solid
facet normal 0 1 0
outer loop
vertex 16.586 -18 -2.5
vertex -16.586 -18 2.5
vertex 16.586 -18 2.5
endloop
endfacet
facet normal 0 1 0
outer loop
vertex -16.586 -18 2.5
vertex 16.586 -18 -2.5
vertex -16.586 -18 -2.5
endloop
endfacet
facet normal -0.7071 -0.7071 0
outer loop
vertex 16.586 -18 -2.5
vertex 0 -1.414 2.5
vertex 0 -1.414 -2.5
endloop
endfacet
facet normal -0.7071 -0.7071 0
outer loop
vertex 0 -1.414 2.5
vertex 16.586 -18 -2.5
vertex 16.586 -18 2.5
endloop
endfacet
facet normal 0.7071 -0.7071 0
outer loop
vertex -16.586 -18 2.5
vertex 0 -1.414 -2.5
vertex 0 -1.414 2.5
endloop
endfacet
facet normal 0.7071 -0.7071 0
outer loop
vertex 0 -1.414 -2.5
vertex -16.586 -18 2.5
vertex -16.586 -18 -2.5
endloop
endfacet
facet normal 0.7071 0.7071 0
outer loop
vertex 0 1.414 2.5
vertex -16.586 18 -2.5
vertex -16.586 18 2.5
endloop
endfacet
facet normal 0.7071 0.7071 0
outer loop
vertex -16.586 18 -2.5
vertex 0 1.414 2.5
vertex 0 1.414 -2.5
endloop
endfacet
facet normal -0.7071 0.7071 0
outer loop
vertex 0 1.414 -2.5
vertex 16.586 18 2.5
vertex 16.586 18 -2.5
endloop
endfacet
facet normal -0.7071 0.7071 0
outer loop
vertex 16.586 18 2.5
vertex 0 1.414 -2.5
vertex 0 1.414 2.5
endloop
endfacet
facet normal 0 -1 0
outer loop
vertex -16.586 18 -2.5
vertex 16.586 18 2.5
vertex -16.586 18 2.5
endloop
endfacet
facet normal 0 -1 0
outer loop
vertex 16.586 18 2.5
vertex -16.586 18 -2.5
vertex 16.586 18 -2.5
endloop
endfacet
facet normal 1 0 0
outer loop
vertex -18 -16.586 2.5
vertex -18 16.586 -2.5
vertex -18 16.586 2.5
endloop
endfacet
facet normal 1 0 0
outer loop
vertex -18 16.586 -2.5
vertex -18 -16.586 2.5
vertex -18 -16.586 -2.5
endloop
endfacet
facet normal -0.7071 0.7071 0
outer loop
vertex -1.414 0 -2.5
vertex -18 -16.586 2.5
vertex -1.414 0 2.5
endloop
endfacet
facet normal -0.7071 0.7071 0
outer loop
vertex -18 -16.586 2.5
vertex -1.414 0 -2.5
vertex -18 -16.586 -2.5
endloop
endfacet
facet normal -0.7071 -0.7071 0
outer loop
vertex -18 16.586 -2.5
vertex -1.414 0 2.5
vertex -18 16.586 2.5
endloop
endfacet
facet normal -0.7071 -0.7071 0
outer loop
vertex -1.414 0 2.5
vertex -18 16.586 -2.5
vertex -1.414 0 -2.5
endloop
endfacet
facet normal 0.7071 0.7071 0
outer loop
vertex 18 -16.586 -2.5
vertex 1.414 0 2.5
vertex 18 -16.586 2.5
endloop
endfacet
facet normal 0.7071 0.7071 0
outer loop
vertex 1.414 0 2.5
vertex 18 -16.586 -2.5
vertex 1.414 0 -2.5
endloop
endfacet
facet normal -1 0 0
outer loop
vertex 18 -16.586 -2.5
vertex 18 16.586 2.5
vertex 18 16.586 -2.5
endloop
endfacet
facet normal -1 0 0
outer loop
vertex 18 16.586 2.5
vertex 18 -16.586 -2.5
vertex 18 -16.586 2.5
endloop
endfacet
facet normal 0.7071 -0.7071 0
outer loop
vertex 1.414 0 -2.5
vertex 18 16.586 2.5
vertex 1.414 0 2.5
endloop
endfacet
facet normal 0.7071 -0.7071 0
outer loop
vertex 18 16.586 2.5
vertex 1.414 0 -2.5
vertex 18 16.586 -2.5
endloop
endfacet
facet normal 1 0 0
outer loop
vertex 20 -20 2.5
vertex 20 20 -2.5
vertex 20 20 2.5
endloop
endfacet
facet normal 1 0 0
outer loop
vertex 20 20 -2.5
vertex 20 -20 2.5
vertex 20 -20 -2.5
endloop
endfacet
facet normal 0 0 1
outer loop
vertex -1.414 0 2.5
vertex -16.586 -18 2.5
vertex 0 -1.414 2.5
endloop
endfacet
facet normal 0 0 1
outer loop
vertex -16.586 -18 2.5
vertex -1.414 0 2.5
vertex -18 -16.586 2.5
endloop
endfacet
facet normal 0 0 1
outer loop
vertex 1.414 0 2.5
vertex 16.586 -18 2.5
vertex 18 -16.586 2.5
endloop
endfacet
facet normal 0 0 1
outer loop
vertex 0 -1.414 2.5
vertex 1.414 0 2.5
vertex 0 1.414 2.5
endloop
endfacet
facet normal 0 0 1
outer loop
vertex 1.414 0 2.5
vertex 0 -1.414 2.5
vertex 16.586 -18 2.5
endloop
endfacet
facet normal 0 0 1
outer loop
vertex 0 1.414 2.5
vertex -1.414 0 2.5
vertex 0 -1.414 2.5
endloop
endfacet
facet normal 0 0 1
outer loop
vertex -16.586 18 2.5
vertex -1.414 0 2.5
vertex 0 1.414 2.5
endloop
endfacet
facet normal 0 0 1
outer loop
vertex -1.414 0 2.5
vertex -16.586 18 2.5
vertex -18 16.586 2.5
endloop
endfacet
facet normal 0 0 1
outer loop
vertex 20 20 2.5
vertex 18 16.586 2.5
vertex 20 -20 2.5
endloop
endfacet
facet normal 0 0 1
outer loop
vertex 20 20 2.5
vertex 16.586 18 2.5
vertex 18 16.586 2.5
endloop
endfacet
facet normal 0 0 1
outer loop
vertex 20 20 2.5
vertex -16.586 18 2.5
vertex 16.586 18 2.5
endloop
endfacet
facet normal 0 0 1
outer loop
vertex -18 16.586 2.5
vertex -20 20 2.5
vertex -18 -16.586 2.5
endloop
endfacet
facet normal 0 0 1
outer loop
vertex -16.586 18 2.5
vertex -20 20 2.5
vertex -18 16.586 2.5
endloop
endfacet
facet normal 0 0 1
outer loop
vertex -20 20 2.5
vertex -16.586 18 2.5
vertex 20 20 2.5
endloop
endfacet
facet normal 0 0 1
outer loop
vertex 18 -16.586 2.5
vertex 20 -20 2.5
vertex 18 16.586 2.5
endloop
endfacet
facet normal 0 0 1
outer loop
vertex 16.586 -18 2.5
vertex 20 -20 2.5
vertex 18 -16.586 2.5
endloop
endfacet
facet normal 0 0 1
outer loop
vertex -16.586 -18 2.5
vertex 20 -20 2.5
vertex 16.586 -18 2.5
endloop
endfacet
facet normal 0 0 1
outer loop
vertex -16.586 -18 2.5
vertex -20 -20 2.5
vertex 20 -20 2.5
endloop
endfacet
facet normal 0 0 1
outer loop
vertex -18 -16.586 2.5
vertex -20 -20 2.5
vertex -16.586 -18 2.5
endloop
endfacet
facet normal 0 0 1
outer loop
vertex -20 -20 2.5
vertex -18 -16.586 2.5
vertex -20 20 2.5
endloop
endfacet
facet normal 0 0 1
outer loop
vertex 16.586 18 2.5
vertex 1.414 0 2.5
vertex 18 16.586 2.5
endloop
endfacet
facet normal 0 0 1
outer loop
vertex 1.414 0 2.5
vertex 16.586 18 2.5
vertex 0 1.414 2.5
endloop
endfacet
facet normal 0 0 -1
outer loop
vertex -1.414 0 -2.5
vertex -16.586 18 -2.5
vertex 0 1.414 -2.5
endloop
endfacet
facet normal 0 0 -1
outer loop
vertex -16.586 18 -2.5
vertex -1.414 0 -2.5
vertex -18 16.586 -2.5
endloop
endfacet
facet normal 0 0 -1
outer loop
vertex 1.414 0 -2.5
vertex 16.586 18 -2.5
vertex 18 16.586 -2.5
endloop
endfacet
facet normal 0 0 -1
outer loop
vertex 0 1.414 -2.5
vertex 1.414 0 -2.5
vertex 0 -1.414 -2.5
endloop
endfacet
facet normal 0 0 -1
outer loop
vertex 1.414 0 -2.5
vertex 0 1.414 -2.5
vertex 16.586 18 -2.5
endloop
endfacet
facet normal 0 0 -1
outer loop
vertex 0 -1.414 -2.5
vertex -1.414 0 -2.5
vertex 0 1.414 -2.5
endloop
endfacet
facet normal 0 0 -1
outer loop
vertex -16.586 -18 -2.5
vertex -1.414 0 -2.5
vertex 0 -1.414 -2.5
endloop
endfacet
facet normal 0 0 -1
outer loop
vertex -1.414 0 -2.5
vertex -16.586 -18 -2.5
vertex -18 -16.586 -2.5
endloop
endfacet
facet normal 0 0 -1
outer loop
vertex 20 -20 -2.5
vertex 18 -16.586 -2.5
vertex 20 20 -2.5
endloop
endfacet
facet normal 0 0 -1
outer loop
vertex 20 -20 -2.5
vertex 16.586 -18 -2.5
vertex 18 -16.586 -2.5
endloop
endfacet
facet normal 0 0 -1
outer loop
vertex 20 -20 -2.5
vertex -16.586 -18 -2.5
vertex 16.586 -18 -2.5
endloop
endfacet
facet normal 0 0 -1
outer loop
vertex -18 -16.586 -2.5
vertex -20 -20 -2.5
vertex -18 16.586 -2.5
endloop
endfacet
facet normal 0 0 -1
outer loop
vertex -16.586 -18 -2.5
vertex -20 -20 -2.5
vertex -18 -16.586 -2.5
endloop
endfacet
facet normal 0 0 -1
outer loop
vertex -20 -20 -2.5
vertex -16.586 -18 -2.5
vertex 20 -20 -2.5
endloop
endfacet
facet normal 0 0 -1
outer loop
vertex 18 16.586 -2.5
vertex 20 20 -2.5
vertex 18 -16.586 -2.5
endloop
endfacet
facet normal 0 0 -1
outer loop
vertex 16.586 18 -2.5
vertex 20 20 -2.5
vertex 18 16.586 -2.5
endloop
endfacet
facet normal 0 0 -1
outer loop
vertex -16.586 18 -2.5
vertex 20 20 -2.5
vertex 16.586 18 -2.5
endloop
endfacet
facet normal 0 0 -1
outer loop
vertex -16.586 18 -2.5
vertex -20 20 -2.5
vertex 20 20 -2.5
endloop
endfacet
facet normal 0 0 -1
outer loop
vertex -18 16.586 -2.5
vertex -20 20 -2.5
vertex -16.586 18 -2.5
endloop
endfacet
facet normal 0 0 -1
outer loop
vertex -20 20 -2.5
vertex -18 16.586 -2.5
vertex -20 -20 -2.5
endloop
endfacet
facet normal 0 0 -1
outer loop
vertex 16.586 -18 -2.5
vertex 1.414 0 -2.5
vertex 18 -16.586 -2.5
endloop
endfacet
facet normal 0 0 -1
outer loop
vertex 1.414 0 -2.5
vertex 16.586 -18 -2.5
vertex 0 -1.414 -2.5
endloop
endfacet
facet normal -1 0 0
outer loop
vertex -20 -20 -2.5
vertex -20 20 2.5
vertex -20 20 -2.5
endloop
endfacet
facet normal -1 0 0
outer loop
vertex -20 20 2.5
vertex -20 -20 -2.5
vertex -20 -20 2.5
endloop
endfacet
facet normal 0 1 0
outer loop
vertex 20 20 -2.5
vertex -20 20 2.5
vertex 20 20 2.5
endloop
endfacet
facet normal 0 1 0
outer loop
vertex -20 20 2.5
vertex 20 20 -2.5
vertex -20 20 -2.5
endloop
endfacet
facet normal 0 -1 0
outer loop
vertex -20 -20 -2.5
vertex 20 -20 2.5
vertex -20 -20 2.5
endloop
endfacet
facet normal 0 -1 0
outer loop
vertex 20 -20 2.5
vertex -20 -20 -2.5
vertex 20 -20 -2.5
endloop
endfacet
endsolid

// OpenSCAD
//Parametric Rectangular Truss
//Created by Jon Hollander, 8/16/13

truss_width=40;
truss_height=40;
truss_thickness=5;
beam_thickness_percentage=10; //[1:100]

module truss(base_w,base_h,link_thickness, p){
	x0 = base_w/2;
	y0 = base_h/2;

	x1 =(1-p/100)*x0;
	y1 =(1-p/100)*y0;

	d=p/100*x0/sqrt(2);

	difference(){
		cube([base_w, base_h, link_thickness], center=true);
		translate([0,0,-link_thickness/2-1]){ 
			linear_extrude(height=link_thickness+2) polygon([[-x1+d,-y1],[x1-d,-y1],[0,-d]]);
			linear_extrude(height=link_thickness+2) polygon([[-x1+d,y1],[x1-d,y1],[0,d]]);
			linear_extrude(height=link_thickness+2) 	polygon([[-x1,-y1+d],[-x1,y1-d],[-d,0]]);
			linear_extrude(height=link_thickness+2) 	polygon([[x1,-y1+d],[x1,y1-d],[d,0]]);
			
		}
	}	
}

//For testing and customizer
truss(base_w=truss_width, base_h=truss_height, link_thickness=truss_thickness, p=beam_thickness_percentage);
